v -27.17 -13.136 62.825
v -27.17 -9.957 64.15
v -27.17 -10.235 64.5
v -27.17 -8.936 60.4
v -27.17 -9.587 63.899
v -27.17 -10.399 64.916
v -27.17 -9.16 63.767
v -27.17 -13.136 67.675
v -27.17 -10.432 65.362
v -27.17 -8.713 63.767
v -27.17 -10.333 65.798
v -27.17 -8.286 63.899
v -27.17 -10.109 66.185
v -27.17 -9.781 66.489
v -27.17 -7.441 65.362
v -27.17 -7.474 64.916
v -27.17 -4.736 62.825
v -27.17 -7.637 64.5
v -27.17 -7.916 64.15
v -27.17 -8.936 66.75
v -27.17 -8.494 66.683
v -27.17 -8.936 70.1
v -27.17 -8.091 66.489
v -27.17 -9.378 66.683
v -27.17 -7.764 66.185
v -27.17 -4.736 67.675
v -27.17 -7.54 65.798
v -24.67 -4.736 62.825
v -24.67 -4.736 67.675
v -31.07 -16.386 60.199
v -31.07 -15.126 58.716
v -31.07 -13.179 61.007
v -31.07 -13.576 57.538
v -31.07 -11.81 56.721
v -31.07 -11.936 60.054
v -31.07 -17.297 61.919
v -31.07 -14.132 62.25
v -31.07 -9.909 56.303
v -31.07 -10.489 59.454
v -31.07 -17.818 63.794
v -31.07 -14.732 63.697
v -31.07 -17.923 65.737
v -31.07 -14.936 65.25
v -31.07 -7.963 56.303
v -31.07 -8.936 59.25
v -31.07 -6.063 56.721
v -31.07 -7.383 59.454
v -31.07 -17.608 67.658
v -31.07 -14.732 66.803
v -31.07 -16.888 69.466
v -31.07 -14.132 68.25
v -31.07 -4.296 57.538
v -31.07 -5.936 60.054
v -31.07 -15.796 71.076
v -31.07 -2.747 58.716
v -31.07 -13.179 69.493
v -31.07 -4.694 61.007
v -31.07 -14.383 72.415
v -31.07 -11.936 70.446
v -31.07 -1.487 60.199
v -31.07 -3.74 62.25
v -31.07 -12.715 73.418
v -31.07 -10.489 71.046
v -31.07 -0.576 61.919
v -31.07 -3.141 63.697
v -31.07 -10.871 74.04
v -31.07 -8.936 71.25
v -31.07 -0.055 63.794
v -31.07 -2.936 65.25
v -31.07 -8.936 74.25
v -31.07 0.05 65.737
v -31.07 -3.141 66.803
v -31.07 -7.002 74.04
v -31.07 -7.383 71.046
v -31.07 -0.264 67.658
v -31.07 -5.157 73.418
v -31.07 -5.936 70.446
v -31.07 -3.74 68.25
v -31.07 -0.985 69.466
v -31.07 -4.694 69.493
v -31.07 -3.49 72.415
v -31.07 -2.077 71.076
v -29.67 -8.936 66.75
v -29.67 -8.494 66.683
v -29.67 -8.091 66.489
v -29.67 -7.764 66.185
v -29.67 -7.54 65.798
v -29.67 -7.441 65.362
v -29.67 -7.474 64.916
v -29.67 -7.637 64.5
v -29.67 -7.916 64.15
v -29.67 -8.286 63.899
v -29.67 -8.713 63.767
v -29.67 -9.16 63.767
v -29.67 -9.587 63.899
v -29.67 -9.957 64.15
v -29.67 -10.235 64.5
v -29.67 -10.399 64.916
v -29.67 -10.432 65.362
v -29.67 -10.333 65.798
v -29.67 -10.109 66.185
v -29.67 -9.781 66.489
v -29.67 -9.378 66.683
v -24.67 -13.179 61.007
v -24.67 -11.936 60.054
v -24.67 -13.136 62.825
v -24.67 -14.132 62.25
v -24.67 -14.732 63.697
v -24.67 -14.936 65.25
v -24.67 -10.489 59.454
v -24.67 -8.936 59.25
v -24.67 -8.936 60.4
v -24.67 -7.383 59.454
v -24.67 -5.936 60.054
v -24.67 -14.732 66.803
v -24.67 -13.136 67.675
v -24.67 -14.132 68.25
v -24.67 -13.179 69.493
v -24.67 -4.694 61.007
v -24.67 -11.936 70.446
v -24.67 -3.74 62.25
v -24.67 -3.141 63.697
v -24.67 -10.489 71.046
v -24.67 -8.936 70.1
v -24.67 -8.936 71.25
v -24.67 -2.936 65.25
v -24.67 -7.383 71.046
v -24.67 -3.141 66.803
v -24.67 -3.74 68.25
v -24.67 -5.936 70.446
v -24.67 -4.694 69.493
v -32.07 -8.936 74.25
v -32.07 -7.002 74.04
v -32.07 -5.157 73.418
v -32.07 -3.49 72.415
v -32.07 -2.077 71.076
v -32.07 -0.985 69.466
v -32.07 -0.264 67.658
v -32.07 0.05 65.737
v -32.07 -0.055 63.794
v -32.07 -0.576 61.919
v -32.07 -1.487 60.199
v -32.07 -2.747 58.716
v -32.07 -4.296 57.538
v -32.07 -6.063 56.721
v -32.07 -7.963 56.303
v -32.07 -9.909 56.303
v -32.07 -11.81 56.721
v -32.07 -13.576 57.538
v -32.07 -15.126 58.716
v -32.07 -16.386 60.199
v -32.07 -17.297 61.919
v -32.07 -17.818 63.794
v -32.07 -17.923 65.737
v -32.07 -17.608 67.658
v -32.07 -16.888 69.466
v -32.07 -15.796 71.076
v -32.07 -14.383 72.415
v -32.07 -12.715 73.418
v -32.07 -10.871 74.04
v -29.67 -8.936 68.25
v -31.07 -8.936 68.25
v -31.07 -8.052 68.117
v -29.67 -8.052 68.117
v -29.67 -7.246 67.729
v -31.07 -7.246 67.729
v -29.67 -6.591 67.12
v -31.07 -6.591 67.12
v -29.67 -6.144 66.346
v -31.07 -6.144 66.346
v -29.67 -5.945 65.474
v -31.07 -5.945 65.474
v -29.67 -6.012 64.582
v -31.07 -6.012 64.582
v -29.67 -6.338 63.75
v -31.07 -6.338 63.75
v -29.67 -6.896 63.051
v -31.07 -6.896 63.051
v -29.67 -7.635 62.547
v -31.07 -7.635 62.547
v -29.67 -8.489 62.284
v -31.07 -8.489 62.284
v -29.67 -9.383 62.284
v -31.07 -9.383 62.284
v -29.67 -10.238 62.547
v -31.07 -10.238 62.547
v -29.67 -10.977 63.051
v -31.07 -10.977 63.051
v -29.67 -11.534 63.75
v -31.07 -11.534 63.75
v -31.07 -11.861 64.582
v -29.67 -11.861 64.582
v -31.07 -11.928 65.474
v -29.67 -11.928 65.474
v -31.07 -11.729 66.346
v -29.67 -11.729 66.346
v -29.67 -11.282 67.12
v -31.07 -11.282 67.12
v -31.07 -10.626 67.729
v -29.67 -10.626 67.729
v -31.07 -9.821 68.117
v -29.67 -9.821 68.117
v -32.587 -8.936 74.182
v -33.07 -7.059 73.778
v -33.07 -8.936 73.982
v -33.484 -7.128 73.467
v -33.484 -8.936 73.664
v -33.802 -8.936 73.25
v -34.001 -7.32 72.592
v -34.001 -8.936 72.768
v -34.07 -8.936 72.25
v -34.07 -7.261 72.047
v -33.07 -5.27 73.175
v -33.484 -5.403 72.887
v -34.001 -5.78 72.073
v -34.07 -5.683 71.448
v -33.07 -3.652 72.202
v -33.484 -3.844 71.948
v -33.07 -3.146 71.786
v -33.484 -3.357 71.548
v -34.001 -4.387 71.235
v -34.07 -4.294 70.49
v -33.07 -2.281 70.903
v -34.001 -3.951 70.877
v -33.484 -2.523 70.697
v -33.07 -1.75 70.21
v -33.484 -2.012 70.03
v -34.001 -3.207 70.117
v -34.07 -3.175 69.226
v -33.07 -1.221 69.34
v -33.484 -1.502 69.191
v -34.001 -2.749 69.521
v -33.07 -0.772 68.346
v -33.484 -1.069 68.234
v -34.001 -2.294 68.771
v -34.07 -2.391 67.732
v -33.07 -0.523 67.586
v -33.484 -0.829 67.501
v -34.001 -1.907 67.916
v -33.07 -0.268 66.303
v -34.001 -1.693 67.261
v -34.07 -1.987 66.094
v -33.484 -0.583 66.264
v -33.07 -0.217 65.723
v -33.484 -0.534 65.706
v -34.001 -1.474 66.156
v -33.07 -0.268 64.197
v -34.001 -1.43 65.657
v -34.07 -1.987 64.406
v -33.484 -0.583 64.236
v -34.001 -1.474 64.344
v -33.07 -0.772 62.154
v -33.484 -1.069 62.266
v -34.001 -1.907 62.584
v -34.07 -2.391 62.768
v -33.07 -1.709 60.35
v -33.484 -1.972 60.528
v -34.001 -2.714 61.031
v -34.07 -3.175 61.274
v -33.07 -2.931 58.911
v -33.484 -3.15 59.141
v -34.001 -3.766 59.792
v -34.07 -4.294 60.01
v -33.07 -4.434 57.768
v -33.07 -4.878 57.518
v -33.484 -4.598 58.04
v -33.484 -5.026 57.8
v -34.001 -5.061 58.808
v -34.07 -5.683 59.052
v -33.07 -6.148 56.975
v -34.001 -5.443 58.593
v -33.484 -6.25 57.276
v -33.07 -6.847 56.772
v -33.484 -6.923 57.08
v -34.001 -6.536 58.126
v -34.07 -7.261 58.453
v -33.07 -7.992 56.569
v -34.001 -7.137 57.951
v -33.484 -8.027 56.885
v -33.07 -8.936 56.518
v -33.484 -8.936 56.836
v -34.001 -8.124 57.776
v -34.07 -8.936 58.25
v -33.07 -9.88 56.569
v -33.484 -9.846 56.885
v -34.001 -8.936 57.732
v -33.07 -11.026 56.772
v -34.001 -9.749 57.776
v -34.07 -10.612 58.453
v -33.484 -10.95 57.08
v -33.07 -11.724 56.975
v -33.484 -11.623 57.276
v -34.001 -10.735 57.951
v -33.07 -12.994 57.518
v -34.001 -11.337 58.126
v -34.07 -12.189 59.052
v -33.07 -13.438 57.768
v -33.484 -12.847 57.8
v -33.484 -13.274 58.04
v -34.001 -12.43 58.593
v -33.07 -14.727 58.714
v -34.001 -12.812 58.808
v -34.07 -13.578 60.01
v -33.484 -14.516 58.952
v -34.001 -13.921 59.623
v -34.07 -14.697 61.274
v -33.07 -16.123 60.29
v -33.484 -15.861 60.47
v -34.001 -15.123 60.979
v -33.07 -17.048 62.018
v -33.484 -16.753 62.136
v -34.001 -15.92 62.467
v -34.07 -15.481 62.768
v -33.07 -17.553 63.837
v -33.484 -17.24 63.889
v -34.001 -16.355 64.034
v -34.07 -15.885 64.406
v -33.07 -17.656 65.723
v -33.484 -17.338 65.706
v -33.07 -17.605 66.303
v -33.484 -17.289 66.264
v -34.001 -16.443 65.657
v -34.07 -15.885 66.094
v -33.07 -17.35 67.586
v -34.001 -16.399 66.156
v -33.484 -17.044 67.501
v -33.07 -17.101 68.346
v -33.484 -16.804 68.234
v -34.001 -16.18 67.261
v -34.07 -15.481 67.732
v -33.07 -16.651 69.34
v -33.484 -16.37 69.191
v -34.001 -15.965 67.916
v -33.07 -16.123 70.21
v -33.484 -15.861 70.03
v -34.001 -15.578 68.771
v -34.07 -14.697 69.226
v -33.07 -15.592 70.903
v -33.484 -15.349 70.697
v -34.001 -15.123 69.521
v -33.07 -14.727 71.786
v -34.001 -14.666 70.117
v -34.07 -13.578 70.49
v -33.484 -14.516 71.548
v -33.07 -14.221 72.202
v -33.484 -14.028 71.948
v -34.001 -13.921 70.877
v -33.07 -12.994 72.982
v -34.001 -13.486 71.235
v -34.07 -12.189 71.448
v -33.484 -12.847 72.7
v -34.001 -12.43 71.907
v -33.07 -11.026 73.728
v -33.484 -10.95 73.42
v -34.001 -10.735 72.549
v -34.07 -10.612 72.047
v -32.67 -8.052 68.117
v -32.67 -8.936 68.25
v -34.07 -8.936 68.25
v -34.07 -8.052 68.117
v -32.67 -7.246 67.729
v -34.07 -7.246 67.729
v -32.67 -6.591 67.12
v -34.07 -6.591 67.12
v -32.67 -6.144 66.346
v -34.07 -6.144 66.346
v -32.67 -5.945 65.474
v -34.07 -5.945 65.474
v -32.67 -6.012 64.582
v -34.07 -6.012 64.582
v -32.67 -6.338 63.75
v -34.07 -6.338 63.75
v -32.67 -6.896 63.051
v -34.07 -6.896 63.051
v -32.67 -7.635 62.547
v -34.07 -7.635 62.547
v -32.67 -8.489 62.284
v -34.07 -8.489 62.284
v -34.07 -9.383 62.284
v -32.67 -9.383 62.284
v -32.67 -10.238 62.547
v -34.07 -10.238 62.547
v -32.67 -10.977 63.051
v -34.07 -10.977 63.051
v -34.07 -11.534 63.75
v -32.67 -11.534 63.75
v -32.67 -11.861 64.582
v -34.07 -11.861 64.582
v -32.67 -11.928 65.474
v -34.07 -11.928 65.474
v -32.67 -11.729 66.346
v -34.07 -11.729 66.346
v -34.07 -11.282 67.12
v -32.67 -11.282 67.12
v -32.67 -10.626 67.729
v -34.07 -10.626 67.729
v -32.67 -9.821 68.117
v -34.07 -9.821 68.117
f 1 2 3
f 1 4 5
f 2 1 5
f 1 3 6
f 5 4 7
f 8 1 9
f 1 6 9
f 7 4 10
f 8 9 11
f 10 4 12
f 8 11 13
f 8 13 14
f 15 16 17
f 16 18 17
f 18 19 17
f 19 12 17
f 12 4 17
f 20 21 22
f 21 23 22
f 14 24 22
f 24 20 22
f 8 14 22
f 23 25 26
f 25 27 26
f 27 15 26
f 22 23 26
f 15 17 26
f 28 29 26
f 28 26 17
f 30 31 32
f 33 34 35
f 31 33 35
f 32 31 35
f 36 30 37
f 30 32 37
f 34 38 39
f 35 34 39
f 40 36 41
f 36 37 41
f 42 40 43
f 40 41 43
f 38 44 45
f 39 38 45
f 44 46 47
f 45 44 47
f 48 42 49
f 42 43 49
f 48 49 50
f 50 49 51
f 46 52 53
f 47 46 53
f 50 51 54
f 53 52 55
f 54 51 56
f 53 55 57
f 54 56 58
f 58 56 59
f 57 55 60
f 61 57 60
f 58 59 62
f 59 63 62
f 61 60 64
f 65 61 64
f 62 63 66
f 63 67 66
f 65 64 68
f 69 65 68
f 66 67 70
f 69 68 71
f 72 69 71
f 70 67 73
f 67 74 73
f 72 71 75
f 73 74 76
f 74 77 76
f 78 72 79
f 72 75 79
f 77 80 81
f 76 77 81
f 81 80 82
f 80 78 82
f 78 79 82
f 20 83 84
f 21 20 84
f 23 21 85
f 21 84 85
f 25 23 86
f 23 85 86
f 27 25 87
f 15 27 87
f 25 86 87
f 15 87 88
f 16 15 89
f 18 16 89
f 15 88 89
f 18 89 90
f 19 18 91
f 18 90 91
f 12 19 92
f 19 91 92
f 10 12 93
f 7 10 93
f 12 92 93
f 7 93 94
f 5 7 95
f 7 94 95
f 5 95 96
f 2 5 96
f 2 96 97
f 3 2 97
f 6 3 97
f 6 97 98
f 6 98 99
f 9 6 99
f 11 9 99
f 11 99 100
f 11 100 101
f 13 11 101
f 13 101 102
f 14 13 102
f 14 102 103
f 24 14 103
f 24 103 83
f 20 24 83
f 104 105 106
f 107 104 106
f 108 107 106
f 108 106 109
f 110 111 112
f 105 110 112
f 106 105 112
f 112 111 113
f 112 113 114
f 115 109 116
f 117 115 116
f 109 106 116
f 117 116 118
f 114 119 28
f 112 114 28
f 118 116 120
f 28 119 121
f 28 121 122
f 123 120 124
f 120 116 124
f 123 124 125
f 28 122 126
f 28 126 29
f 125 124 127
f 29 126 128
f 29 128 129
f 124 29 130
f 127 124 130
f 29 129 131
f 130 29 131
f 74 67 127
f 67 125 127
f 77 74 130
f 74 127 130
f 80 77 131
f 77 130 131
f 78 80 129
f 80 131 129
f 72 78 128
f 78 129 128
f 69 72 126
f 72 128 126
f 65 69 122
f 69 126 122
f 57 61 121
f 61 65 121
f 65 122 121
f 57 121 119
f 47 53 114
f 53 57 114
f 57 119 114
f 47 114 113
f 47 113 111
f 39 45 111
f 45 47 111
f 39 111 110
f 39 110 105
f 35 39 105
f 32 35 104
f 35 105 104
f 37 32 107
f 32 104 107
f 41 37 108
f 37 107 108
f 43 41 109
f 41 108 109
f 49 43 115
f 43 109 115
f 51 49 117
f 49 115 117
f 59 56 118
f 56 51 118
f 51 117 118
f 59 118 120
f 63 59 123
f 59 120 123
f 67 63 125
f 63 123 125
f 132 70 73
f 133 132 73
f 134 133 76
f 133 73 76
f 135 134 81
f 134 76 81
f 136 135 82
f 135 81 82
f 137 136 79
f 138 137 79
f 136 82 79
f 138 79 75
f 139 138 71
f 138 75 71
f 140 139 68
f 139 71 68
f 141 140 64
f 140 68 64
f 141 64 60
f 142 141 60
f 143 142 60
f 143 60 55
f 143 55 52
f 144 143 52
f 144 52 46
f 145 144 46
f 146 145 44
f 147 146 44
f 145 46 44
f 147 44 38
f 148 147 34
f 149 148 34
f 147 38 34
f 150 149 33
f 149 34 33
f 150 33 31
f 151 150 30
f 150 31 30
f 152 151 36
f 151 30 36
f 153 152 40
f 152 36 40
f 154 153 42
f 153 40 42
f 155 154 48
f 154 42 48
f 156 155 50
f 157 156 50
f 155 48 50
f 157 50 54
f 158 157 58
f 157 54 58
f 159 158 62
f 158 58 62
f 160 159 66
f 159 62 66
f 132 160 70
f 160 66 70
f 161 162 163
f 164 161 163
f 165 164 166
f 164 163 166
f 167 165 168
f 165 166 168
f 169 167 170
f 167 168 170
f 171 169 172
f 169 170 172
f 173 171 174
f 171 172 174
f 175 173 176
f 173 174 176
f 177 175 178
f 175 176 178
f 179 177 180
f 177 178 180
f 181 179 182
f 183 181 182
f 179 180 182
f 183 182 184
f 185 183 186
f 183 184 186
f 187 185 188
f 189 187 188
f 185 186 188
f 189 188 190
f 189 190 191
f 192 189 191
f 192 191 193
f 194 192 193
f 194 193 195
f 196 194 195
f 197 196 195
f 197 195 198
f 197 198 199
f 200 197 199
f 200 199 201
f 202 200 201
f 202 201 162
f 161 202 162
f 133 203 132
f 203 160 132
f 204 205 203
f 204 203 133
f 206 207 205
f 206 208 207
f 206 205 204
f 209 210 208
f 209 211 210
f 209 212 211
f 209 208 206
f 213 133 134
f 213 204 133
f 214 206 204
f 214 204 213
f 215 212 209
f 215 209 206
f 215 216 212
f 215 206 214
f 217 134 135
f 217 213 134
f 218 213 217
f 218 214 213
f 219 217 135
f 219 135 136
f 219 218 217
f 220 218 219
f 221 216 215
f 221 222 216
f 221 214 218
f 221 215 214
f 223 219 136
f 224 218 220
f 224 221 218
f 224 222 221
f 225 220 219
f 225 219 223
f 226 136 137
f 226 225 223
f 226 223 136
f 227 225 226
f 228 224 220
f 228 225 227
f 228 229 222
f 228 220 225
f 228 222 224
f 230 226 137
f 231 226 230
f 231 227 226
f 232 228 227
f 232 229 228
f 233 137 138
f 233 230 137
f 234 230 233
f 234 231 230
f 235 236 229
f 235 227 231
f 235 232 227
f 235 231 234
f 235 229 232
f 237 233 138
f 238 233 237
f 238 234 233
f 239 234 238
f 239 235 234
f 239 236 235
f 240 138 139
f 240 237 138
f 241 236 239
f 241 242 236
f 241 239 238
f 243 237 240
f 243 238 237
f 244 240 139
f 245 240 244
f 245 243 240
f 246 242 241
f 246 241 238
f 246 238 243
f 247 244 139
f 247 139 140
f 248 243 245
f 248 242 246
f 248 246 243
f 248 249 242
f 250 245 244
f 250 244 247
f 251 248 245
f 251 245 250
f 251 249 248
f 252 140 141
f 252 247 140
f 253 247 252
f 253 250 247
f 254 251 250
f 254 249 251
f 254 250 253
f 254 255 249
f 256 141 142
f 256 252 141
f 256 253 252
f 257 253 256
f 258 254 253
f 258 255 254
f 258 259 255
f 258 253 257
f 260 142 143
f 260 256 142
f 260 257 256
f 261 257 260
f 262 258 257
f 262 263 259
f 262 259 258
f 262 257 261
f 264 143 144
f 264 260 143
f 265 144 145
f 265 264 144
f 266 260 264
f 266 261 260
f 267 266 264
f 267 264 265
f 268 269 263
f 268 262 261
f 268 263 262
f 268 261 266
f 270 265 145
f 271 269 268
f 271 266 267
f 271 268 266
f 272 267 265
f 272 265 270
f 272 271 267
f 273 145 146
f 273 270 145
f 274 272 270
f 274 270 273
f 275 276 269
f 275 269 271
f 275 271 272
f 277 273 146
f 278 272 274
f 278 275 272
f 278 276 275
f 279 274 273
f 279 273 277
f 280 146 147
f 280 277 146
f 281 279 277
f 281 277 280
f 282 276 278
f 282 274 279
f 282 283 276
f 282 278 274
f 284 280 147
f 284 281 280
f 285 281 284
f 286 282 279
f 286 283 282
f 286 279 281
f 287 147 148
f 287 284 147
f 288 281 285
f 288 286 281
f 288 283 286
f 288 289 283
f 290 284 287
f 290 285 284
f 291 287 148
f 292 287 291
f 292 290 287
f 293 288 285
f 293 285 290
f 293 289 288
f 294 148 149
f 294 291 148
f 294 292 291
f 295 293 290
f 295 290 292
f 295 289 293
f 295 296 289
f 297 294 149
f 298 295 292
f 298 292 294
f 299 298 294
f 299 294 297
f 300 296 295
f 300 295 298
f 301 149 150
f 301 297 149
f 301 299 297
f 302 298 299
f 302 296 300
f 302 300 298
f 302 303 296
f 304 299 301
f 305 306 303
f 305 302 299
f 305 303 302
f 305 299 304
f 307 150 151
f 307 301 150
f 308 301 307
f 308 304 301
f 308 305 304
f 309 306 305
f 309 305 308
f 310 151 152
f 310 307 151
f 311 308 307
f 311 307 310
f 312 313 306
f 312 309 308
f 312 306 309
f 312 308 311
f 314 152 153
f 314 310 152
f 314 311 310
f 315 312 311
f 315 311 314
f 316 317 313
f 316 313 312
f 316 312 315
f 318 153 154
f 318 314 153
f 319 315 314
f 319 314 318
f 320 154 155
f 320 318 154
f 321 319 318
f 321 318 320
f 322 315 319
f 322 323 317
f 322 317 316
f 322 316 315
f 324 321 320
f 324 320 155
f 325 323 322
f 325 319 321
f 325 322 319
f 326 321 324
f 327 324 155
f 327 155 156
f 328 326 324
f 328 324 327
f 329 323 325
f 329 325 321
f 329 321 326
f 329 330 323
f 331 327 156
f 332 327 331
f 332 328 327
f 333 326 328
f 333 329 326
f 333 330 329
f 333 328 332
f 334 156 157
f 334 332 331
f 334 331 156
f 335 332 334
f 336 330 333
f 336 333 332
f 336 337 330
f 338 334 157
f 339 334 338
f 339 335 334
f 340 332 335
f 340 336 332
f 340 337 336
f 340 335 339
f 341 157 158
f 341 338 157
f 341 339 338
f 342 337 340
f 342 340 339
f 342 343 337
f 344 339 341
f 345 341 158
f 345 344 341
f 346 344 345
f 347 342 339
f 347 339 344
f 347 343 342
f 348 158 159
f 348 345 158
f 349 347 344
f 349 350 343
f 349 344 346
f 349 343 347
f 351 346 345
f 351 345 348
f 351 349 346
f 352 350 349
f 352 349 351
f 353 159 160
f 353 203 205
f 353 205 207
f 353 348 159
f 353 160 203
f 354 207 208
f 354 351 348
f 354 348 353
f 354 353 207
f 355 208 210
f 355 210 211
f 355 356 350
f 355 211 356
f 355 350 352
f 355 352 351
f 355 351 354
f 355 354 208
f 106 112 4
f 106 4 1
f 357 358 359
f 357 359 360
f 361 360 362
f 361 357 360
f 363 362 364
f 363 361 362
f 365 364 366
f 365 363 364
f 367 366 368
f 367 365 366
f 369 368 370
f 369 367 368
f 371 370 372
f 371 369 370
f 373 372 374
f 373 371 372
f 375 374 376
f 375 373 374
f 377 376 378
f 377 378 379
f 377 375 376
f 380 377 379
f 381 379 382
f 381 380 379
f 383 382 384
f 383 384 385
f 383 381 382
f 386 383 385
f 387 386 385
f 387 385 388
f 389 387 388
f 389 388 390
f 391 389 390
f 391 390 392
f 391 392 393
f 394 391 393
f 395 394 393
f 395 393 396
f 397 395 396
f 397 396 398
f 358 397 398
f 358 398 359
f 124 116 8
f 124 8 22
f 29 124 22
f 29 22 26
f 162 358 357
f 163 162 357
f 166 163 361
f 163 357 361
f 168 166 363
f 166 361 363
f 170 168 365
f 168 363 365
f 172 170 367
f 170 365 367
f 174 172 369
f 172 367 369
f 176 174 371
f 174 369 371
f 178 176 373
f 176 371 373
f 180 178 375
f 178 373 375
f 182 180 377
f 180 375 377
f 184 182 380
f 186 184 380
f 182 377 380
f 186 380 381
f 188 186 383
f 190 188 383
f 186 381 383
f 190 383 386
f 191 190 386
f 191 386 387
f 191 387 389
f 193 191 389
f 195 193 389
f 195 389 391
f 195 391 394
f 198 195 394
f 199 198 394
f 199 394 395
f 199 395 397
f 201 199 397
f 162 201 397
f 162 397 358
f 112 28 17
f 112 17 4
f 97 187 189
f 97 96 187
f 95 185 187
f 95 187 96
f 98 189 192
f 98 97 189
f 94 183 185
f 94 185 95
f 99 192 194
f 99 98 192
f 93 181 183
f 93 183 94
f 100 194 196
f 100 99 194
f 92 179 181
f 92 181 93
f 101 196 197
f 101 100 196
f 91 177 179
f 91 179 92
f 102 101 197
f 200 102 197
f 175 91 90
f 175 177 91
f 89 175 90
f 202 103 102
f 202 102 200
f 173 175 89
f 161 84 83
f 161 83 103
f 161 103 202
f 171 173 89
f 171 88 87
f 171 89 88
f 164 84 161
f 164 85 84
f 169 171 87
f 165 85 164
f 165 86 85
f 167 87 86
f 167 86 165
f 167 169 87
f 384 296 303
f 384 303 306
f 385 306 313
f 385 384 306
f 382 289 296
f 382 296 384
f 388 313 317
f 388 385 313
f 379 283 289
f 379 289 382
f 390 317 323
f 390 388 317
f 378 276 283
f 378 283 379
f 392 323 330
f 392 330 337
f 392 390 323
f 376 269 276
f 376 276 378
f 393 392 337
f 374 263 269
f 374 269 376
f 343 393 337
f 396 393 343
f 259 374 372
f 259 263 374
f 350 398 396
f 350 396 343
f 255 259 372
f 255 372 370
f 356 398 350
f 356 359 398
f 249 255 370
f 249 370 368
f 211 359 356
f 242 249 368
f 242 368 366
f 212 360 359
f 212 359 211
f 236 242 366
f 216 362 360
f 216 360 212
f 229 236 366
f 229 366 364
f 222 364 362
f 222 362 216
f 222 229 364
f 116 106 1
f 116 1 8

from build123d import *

# Parameters (mm, degrees)
CROQUIS1_R              = 6
SALIENTE_EXTRUIR1_DEPTH = 2.5
CROQUIS2_R              = 6
SALIENTE_EXTRUIR2_DEPTH = 5.5
CROQUIS3_R              = 1.5
CORTAR_EXTRUIR1_DEPTH   = 12.5
CROQUIS4_R              = 3
CORTAR_EXTRUIR2_DEPTH   = 3
CROQUIS5_R              = 9
CROQUIS5_R_2            = 3
SALIENTE_EXTRUIR3_DEPTH = 3
REDONDEO1_R             = 2


with BuildPart() as part:
    # Croquis1 → Saliente-Extruir1 (new body)
    with BuildSketch(Plane.ZY.offset(24.669607513)):
        with Locations((65.25, -8.936333162)):
            Circle(CROQUIS1_R)
        Polygon((67.674871131, -4.736333162), (62.825128869, -4.736333162), (60.400257739, -8.936333162), (62.825128869, -13.136333162), (67.674871131, -13.136333162), (70.099742261, -8.936333162), align=None, mode=Mode.SUBTRACT)
    extrude(amount=SALIENTE_EXTRUIR1_DEPTH)

    # Croquis2 → Saliente-Extruir2 (add)
    with BuildSketch(Plane.ZY.offset(27.169607513)):
        with Locations((65.25, -8.936333162)):
            Circle(CROQUIS2_R)
    extrude(amount=SALIENTE_EXTRUIR2_DEPTH)

    # Croquis3 → Cortar-Extruir1 (cut)
    with BuildSketch(Plane.ZY.offset(32.669607513)):
        with Locations((65.25, -8.936333162)):
            Circle(CROQUIS3_R)
    extrude(amount=-CORTAR_EXTRUIR1_DEPTH, mode=Mode.SUBTRACT)

    # Croquis4 → Cortar-Extruir2 (cut)
    with BuildSketch(Plane.ZY.offset(32.669607513)):
        with Locations((65.25, -8.936333162)):
            Circle(CROQUIS4_R)
    extrude(amount=-CORTAR_EXTRUIR2_DEPTH, mode=Mode.SUBTRACT)

    # Croquis5 → Saliente-Extruir3 (add)
    with BuildSketch(Plane.ZY.offset(31.069607513)):
        with Locations((65.25, -8.936333162)):
            Circle(CROQUIS5_R)
        with Locations((65.25, -8.936333162)):
            Circle(CROQUIS5_R_2, mode=Mode.SUBTRACT)
    extrude(amount=SALIENTE_EXTRUIR3_DEPTH)

    # Redondeo1
    redondeo1_edges = [part.edges().sort_by_distance(p)[0] for p in [
        (-34.069607513, -8.936333162, 56.25),
    ]]
    fillet(redondeo1_edges, radius=REDONDEO1_R)


solid = part.part
